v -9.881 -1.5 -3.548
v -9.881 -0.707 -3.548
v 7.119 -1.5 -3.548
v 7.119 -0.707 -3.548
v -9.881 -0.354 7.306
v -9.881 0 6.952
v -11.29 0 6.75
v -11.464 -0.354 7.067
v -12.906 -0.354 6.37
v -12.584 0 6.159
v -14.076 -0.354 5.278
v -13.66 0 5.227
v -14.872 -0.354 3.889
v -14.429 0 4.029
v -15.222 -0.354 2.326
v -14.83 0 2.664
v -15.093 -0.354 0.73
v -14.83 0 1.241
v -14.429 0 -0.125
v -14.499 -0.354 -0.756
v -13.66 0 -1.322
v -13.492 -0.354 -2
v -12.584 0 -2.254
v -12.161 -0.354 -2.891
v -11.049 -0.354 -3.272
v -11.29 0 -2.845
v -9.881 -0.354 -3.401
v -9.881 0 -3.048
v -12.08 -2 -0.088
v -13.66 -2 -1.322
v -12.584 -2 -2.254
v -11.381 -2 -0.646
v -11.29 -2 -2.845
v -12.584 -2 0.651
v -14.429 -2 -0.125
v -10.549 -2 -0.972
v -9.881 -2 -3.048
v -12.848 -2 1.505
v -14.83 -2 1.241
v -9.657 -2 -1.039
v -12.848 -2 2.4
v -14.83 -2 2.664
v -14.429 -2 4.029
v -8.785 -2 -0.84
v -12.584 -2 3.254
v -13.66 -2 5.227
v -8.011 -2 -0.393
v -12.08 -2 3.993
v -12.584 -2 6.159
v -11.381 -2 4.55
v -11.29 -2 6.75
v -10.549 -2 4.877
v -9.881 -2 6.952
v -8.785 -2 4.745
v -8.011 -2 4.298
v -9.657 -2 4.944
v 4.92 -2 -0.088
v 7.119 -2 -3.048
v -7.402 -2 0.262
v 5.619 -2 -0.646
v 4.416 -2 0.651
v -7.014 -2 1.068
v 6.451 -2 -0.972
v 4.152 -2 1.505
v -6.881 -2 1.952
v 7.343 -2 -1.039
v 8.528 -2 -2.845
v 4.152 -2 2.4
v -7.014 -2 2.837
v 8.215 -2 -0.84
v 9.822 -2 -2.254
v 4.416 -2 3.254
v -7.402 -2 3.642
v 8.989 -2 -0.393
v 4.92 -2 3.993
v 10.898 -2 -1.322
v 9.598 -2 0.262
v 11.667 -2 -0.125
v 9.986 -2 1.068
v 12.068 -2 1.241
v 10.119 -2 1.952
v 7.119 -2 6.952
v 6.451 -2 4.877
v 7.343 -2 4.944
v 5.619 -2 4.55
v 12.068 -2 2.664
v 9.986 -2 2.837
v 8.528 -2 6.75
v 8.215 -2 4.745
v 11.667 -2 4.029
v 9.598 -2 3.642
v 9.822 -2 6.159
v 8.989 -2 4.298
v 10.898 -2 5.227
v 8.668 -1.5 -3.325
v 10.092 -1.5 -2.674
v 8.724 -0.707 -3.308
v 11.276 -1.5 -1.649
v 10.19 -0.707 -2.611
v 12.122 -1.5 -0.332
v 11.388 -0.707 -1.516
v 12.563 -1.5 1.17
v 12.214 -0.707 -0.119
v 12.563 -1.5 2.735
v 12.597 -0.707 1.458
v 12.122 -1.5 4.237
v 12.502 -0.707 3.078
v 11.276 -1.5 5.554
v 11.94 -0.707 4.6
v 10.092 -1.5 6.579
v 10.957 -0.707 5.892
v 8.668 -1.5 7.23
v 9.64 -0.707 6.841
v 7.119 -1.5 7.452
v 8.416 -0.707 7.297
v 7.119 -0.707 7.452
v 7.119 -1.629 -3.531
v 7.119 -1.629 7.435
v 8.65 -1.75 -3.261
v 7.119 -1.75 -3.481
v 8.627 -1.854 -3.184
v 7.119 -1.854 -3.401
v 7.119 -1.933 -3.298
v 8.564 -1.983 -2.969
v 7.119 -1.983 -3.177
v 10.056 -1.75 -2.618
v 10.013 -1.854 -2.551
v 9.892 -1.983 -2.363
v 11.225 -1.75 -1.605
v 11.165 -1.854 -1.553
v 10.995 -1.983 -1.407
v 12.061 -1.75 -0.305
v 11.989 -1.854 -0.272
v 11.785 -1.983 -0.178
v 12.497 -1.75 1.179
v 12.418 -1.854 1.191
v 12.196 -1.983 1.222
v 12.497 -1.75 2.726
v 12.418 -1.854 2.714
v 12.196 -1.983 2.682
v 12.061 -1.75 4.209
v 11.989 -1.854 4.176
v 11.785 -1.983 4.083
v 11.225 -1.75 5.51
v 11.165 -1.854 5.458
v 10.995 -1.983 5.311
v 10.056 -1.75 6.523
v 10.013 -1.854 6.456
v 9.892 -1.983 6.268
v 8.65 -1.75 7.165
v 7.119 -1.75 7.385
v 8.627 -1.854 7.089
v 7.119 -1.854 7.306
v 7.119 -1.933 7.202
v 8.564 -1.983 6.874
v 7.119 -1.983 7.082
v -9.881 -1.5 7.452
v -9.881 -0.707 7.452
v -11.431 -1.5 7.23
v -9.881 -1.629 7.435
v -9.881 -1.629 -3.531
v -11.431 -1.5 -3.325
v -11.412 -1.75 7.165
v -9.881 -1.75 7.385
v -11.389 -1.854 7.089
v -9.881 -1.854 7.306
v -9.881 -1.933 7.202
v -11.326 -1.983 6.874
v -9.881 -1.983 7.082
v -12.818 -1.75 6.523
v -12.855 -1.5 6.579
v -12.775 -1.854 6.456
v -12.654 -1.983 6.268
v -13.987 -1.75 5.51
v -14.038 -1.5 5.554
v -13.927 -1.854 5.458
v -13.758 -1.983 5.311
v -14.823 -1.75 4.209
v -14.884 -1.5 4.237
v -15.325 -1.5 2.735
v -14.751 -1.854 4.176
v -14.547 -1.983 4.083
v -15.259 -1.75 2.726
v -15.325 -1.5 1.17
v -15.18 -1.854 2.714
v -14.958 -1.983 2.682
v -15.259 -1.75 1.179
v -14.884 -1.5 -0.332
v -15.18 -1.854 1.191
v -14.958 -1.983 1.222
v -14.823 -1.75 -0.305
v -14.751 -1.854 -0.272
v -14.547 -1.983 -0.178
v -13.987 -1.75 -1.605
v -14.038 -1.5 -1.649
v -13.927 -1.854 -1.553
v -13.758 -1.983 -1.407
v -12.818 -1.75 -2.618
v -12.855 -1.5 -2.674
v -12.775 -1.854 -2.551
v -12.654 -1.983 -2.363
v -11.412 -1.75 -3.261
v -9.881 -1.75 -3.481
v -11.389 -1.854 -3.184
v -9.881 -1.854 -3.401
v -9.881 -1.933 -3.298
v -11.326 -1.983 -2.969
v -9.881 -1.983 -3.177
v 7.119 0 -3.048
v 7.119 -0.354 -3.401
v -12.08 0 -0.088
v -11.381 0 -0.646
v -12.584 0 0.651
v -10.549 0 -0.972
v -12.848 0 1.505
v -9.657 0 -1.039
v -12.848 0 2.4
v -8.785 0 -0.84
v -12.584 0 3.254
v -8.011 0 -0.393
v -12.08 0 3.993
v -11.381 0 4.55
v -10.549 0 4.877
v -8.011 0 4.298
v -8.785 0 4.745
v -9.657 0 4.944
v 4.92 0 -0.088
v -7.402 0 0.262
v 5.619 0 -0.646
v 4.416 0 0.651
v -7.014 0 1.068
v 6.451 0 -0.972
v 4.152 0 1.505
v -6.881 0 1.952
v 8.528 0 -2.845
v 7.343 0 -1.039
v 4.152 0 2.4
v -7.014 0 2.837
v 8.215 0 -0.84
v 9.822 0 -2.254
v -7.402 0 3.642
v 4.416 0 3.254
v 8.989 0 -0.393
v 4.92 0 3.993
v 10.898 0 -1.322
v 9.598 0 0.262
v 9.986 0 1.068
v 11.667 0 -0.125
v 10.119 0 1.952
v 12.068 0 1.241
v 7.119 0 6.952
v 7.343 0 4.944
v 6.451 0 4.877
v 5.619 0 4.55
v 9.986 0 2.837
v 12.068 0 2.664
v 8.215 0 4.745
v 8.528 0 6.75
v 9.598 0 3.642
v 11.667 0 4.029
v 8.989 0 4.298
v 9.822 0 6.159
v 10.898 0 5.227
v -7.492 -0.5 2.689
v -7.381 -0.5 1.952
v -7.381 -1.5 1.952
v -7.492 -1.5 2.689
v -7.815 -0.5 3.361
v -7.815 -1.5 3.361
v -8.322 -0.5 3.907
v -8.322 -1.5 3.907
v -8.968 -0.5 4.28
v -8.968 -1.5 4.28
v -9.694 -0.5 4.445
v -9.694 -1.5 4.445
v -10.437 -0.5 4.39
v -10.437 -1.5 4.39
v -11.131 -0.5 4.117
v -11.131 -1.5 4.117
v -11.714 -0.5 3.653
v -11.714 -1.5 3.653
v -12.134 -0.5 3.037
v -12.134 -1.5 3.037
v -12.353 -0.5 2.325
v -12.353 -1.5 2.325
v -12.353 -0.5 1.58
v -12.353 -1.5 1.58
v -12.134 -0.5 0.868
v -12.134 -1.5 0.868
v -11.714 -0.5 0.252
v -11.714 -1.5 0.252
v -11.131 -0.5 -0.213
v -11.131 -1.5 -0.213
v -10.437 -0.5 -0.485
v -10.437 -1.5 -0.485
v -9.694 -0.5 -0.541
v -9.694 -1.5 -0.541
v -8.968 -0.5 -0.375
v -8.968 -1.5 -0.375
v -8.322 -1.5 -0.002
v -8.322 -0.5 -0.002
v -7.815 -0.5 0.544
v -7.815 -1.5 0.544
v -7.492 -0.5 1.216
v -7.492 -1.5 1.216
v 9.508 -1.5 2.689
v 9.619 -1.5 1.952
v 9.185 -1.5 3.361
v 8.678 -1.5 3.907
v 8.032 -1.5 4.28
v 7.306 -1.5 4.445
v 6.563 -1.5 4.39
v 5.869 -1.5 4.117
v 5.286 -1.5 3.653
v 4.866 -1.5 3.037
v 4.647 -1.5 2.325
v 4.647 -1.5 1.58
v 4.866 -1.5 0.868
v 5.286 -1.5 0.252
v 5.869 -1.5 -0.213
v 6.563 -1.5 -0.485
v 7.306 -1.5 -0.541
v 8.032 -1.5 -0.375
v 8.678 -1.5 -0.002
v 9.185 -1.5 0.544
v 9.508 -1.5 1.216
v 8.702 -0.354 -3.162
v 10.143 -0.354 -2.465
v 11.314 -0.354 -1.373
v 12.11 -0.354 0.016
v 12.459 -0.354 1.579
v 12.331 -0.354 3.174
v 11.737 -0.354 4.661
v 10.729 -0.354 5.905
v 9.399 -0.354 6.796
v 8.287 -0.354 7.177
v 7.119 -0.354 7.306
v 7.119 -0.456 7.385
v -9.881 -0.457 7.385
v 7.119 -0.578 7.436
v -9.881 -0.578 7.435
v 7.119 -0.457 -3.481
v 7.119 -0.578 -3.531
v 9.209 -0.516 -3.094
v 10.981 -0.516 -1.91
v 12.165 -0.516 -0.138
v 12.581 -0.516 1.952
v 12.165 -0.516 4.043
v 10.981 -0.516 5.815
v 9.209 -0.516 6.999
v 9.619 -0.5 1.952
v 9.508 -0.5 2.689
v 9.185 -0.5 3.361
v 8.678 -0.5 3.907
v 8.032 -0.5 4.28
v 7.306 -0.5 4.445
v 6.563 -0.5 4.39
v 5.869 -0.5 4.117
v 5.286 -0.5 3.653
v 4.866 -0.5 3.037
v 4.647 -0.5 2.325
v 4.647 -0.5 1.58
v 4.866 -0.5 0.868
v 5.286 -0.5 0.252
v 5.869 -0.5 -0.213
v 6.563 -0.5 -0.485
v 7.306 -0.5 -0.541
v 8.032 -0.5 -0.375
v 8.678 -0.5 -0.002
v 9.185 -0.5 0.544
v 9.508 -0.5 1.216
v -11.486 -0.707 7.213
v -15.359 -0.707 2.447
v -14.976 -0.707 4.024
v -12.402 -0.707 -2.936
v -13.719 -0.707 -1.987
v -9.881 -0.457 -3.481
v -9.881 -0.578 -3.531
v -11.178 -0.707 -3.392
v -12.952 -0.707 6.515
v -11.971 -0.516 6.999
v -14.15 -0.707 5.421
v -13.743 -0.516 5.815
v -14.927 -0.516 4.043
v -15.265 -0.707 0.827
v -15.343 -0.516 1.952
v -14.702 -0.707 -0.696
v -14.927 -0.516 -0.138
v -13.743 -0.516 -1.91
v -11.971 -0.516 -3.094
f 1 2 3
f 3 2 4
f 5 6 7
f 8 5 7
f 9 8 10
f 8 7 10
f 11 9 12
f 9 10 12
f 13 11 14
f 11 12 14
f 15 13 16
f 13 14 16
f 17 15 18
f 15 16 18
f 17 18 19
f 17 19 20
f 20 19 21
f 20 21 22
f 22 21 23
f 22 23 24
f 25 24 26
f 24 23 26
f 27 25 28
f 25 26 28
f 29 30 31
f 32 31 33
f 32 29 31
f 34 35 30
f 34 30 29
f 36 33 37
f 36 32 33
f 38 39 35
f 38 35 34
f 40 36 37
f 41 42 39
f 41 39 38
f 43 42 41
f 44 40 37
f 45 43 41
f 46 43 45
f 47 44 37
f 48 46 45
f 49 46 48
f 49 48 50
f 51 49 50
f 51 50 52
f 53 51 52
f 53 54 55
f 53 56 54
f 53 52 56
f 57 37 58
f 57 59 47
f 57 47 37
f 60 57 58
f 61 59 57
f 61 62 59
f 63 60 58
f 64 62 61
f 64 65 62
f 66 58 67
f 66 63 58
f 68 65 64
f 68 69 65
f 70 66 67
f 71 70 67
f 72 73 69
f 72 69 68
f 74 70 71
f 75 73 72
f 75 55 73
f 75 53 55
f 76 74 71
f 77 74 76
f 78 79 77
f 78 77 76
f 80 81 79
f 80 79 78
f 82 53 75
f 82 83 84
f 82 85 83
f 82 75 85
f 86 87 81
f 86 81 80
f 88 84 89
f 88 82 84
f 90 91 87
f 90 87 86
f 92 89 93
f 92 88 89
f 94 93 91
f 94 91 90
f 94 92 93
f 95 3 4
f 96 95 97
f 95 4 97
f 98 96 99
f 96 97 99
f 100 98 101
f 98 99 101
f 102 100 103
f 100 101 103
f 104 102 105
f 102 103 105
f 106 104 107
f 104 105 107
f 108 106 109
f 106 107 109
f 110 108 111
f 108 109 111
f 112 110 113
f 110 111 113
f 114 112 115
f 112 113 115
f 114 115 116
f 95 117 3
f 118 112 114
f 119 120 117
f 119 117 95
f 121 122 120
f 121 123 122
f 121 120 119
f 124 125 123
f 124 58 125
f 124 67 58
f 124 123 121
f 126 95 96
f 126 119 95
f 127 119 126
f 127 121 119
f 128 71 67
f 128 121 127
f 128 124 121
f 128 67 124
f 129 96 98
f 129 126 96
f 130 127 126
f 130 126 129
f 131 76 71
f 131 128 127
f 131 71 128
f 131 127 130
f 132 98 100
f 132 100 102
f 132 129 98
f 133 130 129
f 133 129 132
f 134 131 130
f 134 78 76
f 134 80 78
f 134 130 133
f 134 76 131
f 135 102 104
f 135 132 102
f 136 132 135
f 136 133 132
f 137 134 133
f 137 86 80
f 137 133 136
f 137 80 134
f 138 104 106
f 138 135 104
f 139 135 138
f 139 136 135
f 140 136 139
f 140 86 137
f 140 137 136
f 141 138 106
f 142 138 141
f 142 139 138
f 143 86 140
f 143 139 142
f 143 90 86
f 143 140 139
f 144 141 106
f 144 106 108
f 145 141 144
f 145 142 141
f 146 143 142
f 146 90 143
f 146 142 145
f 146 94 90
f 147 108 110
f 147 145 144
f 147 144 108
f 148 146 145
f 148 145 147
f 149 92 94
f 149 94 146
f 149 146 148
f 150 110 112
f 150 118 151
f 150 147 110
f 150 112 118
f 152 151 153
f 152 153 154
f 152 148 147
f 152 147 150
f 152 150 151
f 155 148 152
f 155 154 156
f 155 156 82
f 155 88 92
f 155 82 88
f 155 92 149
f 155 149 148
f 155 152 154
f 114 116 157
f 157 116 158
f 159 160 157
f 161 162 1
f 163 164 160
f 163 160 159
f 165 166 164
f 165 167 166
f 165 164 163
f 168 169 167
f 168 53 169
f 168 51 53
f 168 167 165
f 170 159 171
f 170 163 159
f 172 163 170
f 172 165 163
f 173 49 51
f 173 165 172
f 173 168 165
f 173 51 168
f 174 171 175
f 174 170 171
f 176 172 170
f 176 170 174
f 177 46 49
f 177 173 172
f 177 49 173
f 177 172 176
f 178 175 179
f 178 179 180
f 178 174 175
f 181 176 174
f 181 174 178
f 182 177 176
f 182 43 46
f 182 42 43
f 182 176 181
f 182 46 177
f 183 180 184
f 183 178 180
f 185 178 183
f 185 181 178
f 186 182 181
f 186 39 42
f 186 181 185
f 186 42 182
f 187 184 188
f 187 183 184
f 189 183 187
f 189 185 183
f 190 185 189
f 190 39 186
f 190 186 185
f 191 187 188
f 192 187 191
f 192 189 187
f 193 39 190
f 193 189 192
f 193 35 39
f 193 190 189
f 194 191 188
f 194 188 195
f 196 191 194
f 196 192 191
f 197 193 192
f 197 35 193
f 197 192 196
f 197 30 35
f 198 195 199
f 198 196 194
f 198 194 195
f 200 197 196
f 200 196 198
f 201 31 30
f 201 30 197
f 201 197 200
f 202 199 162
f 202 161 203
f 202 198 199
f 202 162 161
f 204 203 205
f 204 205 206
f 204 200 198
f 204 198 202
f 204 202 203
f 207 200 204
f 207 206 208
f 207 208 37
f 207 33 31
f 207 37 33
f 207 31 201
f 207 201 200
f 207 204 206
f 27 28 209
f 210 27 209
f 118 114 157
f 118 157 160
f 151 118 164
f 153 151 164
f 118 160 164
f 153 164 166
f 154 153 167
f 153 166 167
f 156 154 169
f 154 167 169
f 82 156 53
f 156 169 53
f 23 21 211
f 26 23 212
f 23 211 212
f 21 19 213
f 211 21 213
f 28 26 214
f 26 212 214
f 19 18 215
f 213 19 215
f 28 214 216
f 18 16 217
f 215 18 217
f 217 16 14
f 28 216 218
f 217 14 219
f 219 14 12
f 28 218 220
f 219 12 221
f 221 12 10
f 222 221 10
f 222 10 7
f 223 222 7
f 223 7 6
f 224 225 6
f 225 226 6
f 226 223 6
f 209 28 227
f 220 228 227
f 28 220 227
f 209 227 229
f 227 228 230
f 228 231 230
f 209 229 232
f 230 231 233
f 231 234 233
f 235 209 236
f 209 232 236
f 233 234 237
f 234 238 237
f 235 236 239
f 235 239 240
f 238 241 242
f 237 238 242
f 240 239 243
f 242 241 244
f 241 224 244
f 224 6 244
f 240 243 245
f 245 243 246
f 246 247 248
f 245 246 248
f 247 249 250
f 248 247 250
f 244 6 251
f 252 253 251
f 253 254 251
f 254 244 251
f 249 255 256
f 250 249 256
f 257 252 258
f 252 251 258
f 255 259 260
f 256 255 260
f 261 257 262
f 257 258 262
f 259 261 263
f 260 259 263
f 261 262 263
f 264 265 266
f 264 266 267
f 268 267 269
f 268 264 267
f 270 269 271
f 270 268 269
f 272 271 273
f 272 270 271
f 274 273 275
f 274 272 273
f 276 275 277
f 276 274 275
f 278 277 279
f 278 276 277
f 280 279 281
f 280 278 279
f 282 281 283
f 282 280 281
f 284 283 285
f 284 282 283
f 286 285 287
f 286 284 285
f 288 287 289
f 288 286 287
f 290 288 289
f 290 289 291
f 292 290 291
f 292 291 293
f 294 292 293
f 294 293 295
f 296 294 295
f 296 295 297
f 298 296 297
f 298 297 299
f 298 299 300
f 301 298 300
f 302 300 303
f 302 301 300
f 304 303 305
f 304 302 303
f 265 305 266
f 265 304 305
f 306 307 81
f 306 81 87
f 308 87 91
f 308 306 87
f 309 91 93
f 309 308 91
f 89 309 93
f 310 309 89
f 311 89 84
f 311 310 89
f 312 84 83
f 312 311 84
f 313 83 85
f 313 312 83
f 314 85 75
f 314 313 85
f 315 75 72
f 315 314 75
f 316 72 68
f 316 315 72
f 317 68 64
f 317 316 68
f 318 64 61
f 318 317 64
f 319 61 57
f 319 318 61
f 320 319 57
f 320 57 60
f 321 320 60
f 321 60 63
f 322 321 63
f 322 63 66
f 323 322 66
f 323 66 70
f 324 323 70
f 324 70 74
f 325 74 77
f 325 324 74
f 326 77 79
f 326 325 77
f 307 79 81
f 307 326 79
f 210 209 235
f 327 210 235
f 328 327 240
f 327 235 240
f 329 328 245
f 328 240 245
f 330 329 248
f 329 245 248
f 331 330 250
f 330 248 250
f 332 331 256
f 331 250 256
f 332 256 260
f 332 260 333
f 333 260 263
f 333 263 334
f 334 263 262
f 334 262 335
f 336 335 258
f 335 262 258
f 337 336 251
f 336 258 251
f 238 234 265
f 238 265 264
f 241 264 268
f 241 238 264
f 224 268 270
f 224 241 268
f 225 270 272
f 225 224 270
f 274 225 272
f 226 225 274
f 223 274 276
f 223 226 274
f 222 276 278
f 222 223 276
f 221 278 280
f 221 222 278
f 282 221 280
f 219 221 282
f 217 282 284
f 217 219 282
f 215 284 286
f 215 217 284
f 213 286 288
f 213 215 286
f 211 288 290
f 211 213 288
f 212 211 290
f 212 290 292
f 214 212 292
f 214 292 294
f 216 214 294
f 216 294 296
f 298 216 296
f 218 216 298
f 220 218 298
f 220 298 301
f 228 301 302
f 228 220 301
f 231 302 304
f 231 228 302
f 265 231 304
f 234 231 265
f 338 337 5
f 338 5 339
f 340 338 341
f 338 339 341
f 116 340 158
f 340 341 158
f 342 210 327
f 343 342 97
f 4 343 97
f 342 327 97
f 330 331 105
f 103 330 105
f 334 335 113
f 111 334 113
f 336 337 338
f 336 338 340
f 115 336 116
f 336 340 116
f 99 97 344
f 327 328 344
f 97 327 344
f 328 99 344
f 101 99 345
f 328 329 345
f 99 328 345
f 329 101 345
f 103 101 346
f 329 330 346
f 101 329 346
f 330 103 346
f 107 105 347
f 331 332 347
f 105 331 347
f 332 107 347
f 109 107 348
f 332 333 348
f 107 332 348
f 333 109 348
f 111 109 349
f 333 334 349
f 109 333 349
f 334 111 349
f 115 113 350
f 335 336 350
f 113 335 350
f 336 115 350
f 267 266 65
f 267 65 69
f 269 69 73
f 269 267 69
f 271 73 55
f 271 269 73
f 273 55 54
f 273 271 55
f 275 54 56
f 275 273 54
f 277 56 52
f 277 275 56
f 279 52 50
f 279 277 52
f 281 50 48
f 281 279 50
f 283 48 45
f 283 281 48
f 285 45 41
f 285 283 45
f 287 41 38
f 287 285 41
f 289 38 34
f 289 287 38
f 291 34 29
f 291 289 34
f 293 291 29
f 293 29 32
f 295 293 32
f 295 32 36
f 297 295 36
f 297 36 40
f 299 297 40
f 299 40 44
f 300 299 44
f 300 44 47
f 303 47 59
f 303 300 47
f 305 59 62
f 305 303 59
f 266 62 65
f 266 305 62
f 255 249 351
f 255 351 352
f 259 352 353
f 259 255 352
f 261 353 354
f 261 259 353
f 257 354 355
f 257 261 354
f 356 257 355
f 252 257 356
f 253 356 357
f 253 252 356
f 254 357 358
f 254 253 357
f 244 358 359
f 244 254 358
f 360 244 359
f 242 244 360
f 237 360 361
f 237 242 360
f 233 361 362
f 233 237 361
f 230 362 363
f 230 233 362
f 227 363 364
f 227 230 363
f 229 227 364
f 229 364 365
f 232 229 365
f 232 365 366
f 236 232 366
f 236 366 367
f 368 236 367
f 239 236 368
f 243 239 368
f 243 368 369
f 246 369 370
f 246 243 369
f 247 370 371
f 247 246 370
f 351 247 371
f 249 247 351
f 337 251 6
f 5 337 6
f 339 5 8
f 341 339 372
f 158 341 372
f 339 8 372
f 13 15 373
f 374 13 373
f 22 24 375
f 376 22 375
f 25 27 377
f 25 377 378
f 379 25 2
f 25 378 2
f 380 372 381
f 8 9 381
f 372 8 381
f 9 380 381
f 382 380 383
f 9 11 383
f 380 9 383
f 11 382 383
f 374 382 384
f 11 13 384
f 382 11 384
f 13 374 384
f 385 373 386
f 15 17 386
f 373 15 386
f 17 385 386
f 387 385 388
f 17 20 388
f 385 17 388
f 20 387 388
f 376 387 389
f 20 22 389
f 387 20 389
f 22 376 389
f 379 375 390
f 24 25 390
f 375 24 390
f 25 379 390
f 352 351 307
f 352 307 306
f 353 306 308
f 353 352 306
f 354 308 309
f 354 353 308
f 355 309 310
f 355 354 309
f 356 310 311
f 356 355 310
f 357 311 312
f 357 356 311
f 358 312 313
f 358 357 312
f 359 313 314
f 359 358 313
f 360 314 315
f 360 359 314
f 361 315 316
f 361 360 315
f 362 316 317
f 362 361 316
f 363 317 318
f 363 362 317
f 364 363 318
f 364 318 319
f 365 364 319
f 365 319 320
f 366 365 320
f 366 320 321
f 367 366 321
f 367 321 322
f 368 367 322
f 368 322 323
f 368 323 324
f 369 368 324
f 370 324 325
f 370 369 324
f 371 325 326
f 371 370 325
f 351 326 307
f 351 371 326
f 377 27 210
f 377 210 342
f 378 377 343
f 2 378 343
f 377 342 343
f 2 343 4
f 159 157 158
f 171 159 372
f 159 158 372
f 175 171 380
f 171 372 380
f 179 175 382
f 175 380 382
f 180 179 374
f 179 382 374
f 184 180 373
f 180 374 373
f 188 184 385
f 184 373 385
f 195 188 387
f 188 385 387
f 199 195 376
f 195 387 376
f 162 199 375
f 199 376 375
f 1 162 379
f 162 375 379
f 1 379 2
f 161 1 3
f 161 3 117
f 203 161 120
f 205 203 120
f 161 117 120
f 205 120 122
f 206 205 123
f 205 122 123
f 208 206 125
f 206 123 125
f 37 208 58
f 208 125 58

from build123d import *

# Parameters (mm, degrees)
F0_R     = 2.5
F1_DEPTH = 2
F2_R     = 0.5
F3_SIZE  = 0.5
F4_SIZE  = 0.5
F5_R     = 0.5


with BuildPart() as f1:
    # F0 (on Front) → F1 (new body)
    with BuildSketch(Plane.XZ):
        with BuildLine():
            Line((7.1189217238, 7.4524198854), (-9.8810782762, 7.4524198854))
            ThreePointArc((-9.8810782762, 7.4524198854), (-15.3810782762, 1.9524198854), (-9.8810782762, -3.5475801146))
            Line((-9.8810782762, -3.5475801146), (7.1189217238, -3.5475801146))
            ThreePointArc((7.1189217238, -3.5475801146), (12.6189217238, 1.9524198854), (7.1189217238, 7.4524198854))
        make_face()
        with Locations((-9.8810782762, 1.9524198854)):
            Circle(F0_R, mode=Mode.SUBTRACT)
        with Locations((7.1189217238, 1.9524198854)):
            Circle(F0_R, mode=Mode.SUBTRACT)
    extrude(amount=F1_DEPTH)

    # F2
    f2_edges = [f1.edges().sort_by_distance(p)[0] for p in [
        (-1.381078, -2, 7.45242),
    ]]
    fillet(f2_edges, radius=F2_R)

    # F3
    f3_edges = [f1.edges().sort_by_distance(p)[0] for p in [
        (-12.381078, -2, 1.95242),
        (4.618922, -2, 1.95242),
    ]]
    chamfer(f3_edges, length=F3_SIZE)

    # F4
    f4_edges = [f1.edges().sort_by_distance(p)[0] for p in [
        (-12.381078, 0, 1.95242),
        (-1.381078, 0, 7.45242),
        (-15.381078, 0, 1.95242),
        (-1.381078, 0, -3.54758),
        (12.618922, 0, 1.95242),
        (4.618922, 0, 1.95242),
    ]]
    chamfer(f4_edges, length=F4_SIZE)

    # F5
    f5_edges = [f1.edges().sort_by_distance(p)[0] for p in [
        (-1.381078, -0.5, -3.54758),
    ]]
    fillet(f5_edges, radius=F5_R)


solid = f1.part
